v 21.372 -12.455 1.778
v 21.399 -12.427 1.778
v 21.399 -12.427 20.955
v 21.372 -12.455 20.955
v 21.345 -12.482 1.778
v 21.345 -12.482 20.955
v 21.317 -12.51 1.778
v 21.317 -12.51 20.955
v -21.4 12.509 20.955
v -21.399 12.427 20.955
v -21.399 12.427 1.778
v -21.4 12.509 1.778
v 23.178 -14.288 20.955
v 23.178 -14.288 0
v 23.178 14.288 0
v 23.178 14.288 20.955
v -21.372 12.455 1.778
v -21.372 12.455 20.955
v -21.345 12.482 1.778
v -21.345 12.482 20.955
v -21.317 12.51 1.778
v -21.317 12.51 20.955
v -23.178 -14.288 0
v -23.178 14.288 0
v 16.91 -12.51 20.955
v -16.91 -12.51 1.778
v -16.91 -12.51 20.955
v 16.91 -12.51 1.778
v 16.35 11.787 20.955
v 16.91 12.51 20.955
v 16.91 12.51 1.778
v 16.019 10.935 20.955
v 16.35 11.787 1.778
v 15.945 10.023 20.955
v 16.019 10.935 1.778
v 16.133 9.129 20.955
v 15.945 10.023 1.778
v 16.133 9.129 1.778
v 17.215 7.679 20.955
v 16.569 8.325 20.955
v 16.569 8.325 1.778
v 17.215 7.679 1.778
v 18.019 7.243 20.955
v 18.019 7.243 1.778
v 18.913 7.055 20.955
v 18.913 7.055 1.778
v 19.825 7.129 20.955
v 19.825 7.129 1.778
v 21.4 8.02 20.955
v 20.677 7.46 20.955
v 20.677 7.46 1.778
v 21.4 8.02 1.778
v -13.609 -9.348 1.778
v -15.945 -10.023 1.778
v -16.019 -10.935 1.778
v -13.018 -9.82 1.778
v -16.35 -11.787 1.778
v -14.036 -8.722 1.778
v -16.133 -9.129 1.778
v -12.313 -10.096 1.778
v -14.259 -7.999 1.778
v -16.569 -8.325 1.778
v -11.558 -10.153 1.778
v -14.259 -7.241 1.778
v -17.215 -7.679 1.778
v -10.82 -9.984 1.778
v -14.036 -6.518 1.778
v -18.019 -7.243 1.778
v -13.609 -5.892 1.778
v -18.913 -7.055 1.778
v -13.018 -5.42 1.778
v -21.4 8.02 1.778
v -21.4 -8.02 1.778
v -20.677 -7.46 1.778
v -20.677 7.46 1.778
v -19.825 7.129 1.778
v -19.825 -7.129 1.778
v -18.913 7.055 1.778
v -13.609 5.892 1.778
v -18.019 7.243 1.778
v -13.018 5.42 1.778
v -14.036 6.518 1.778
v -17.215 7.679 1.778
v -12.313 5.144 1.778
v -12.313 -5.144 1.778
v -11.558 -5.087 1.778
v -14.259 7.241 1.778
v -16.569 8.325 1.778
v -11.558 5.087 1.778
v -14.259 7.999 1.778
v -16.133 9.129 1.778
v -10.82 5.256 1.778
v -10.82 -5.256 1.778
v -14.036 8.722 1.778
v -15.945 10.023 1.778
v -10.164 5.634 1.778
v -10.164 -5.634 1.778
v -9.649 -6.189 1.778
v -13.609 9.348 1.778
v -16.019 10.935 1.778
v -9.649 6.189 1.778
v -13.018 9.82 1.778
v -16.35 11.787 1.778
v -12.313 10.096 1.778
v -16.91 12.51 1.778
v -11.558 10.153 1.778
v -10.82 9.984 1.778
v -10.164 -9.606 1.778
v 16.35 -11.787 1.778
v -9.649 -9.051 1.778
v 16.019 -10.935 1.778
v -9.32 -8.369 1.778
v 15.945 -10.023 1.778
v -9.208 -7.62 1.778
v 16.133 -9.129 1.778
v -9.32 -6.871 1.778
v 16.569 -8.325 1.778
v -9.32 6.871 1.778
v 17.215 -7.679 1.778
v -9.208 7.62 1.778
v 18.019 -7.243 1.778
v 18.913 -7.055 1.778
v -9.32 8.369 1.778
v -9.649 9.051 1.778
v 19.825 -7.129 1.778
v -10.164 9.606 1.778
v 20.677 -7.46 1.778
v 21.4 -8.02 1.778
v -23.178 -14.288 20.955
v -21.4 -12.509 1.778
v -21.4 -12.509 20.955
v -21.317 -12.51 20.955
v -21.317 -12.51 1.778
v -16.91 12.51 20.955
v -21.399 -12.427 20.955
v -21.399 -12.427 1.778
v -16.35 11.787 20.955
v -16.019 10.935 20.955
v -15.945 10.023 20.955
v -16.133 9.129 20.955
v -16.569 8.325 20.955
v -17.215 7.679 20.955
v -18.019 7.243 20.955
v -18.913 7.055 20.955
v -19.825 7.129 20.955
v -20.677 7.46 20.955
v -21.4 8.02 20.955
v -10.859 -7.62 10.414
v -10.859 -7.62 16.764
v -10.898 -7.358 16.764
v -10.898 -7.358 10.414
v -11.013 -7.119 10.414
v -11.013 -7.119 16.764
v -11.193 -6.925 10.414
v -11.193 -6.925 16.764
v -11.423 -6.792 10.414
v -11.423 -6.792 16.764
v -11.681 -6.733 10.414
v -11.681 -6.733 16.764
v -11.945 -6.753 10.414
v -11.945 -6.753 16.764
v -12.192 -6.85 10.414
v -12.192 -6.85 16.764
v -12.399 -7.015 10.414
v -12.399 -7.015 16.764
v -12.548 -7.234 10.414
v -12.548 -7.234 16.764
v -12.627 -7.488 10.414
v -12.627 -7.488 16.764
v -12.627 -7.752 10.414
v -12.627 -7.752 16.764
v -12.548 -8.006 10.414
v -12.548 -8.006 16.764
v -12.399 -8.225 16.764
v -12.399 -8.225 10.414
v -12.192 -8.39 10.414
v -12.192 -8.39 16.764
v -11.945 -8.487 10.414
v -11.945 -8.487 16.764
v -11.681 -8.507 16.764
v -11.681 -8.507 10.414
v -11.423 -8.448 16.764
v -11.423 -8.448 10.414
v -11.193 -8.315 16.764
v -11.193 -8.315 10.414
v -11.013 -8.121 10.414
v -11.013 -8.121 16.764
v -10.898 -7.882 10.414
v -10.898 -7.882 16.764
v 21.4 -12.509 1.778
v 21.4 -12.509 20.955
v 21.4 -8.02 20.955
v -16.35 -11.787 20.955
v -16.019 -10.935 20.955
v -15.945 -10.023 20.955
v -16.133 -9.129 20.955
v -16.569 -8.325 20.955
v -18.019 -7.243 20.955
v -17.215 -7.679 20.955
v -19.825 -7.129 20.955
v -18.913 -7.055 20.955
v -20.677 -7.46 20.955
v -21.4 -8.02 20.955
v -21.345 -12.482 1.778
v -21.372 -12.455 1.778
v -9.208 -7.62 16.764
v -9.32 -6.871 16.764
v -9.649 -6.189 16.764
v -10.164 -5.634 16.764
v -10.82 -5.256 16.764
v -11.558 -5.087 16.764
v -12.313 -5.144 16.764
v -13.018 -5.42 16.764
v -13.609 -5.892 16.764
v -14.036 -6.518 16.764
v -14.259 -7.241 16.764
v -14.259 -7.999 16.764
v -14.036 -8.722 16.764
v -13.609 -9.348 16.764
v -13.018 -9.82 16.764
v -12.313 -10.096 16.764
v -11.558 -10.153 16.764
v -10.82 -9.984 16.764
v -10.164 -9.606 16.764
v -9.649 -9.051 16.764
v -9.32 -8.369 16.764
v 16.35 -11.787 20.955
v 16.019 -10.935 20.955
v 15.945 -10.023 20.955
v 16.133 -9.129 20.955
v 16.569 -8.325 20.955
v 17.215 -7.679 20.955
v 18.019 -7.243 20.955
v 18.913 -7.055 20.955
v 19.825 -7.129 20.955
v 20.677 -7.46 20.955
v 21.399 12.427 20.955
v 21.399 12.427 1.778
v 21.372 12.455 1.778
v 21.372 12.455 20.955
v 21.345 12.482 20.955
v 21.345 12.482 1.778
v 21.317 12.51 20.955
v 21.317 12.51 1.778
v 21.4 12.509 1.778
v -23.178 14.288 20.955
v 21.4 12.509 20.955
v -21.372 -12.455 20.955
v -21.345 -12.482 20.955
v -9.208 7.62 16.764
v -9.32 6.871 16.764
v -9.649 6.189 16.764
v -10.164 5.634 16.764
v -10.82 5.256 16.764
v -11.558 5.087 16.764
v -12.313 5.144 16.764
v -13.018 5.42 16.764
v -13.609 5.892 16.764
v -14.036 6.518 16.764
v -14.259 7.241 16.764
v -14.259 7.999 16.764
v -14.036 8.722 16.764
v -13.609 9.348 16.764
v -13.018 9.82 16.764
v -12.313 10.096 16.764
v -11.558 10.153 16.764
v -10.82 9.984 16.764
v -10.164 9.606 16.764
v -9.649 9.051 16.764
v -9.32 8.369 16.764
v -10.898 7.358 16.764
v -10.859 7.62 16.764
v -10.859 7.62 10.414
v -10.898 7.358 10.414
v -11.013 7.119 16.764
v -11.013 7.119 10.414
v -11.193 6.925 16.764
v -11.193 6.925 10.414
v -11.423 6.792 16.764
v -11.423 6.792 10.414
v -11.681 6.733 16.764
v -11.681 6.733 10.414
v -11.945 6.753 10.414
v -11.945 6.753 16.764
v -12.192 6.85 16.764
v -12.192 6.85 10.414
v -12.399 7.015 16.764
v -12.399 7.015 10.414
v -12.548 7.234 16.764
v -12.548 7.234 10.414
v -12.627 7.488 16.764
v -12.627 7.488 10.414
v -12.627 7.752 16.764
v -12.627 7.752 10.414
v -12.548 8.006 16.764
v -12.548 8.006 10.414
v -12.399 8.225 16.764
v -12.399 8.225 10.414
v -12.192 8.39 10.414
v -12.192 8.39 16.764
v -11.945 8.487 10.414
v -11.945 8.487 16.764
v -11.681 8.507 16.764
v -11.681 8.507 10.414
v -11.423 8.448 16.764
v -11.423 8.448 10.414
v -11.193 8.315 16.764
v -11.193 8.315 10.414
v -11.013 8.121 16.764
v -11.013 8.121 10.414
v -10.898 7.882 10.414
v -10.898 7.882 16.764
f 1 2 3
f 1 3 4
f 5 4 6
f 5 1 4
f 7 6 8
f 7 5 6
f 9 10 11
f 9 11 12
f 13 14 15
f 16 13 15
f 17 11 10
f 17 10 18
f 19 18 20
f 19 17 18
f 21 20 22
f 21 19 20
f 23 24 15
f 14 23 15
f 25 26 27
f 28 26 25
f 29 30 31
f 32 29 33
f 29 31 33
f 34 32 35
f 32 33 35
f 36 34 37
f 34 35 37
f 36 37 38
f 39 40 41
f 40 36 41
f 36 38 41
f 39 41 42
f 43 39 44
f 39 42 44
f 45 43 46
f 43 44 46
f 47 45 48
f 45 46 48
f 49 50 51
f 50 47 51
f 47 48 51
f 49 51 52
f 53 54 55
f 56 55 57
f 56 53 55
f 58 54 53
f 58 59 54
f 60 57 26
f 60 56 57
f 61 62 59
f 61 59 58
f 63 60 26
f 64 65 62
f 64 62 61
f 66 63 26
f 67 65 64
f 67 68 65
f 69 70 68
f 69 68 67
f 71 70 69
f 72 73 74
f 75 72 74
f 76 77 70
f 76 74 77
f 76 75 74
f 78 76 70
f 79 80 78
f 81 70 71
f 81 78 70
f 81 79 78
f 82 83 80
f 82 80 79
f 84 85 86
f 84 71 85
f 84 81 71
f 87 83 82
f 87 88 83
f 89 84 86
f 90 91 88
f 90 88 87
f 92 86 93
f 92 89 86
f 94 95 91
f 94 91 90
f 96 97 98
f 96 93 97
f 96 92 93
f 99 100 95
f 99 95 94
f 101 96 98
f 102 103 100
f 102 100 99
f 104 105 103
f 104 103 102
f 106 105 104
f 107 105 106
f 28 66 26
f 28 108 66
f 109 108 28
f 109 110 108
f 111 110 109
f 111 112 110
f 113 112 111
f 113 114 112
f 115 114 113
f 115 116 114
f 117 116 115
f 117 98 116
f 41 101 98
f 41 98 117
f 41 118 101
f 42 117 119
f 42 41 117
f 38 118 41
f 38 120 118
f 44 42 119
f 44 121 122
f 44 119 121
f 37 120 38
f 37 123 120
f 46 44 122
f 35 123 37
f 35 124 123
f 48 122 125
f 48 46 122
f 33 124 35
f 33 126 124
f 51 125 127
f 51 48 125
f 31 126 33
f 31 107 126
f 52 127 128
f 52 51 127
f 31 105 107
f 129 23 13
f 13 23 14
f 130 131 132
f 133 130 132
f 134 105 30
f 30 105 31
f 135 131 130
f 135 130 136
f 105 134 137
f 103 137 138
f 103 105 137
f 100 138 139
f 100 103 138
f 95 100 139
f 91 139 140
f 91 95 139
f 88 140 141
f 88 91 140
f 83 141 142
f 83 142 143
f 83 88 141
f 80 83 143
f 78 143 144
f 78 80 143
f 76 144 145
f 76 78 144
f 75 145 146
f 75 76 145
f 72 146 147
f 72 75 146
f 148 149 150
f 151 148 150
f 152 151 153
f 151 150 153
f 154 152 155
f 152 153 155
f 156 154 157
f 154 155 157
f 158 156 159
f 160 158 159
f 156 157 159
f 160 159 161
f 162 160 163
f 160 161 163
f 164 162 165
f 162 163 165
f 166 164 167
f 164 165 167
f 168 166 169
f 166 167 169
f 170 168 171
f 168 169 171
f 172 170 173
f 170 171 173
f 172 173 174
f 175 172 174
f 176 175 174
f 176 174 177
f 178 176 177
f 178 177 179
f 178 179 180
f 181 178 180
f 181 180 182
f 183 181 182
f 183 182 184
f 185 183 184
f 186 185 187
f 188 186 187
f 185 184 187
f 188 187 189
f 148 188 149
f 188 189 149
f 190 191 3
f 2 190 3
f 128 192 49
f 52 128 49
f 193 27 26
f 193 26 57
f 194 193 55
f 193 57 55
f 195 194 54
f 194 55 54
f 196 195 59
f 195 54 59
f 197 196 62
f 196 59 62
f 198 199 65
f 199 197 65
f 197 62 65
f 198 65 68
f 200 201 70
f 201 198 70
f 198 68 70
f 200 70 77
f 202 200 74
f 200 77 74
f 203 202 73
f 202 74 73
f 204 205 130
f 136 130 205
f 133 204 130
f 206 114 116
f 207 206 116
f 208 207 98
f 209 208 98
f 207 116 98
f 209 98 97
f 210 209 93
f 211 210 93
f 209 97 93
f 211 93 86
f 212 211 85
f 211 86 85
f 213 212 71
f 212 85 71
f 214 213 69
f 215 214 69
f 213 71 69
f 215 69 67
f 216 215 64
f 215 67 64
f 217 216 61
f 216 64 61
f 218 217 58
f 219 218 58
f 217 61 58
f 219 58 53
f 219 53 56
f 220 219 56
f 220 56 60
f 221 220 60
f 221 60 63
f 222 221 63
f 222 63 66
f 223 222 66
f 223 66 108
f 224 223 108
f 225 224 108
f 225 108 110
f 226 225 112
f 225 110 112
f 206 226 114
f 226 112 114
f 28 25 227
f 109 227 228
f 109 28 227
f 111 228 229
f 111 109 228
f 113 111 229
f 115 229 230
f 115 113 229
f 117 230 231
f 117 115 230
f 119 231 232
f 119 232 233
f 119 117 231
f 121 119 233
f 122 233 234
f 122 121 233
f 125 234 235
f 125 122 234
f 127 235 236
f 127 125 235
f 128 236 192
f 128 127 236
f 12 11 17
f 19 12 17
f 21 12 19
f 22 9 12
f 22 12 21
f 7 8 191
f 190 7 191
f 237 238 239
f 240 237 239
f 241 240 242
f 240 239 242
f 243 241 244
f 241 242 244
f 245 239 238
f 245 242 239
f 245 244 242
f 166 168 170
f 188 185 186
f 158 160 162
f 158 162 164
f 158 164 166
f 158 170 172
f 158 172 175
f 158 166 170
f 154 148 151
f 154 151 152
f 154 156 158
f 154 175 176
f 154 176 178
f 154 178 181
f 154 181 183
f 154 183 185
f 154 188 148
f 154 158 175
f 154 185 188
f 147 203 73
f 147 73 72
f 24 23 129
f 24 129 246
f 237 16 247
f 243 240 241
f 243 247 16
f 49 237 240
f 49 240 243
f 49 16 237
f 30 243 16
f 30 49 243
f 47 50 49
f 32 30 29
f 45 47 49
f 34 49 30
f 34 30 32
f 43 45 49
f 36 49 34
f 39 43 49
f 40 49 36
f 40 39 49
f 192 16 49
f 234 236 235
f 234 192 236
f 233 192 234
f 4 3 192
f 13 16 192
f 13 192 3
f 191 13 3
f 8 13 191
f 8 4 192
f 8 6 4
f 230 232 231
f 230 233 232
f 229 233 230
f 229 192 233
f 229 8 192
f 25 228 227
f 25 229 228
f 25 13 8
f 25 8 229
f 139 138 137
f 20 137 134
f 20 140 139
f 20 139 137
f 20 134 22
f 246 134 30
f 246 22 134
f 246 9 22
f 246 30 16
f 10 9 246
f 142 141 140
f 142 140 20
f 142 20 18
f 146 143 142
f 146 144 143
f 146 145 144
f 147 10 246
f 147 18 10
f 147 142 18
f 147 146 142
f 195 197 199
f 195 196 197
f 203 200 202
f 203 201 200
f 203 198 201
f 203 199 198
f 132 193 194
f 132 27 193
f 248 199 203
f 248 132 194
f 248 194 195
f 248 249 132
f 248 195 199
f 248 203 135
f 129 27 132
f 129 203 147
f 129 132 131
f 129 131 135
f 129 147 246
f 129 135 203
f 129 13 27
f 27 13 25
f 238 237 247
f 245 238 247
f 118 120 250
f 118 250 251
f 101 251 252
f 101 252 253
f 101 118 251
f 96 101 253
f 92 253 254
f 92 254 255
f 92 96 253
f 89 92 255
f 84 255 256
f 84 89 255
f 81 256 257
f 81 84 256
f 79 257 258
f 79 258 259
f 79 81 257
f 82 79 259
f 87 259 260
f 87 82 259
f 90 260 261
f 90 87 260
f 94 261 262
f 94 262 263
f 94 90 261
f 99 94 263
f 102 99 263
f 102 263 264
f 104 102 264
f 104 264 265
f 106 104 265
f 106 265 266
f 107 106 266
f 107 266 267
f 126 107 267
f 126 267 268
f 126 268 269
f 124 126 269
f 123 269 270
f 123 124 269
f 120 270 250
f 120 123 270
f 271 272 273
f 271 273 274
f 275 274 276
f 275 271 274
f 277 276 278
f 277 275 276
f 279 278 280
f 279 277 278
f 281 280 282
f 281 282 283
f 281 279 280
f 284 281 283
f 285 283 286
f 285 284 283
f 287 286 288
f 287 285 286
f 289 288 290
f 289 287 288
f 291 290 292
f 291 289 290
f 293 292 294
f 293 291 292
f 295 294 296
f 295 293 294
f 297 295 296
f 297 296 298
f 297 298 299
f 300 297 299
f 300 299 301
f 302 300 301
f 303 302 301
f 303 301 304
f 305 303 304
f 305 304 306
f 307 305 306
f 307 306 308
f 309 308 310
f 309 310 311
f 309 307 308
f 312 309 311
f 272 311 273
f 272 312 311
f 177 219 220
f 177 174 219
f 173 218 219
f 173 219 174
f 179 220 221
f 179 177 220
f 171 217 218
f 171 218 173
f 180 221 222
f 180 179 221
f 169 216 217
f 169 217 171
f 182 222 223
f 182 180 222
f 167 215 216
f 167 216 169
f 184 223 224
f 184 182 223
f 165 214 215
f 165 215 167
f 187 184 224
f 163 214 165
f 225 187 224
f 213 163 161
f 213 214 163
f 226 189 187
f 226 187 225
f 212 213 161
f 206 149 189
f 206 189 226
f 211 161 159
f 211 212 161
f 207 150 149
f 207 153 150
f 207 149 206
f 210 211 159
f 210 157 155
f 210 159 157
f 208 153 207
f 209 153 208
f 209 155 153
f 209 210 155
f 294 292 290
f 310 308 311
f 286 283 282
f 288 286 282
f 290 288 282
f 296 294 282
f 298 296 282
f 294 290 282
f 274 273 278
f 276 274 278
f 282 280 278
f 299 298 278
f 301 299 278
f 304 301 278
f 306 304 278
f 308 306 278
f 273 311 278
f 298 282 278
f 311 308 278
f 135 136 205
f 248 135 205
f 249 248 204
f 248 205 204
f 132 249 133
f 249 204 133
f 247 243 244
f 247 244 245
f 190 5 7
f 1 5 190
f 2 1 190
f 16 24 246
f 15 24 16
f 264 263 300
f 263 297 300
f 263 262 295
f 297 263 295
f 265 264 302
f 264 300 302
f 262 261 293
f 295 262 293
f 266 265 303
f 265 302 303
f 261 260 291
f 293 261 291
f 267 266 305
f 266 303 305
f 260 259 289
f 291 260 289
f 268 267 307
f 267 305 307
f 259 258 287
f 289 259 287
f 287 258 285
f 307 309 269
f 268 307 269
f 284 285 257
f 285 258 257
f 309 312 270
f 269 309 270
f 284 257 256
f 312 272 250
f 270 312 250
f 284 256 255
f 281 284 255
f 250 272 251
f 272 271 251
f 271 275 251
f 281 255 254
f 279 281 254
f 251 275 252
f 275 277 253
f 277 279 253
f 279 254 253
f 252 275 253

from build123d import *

# Parameters (mm, degrees)
F0_W             = 46.355
F0_H             = 28.575
F1_DEPTH         = 20.955
F2_T             = -1.778
F3_R             = 2.54
F4_DEPTH         = 14.986
F5_R             = 0.889
F6_DEPTH         = 6.35
F7_R             = 3.175
F8_DEPTH         = 19.177
F8_COPIES2_COUNT = 2


# Not quite as in the source:
# - a pattern or mirror of a feature is missing from the dataset's text; its kind, count and spacing are read off the source's solid


with BuildPart() as f1:
    # F0 (on Top) → F1 (new body)
    with BuildSketch(Plane.XY):
        Rectangle(F0_W, F0_H)
    extrude(amount=F1_DEPTH)

    # F2
    f2_openings = [f1.faces().sort_by_distance(p)[0] for p in [
        (0, 0, 20.955),
    ]]
    offset(amount=F2_T, openings=f2_openings)

    # F3 (on face) → F4 (join)
    with BuildSketch(Plane.XY.offset(1.778)):
        with Locations((-11.7475, -7.62)):
            Circle(F3_R)
    f4 = extrude(amount=F4_DEPTH)

    # F4_copies: F4 across plane
    add(f4.mirror(Plane.ZX))

    # F5 (on face) → F6 (cut)
    with BuildSketch(Plane.XY.offset(16.764)):
        with Locations((-11.7475, -7.62)):
            Circle(F5_R)
    f6 = extrude(amount=-F6_DEPTH, mode=Mode.SUBTRACT)

    # F6_copies: F6 across plane
    add(f6.mirror(Plane.ZX), mode=Mode.SUBTRACT)

    # F7 (on face) → F8 (join, through all)
    with BuildSketch(Plane.XY.offset(1.778)):
        with Locations((-19.1135, -10.2235)):
            Circle(F7_R)
    f8 = extrude(amount=F8_DEPTH)

    # F8_copies: F8 across plane
    add(f8.mirror(Plane.ZX))

    # F8_copies1: F8 across plane
    add(f8.mirror(Plane(origin=(0, 0, 0), x_dir=(0, 0, 1), z_dir=(1, 0, 0))))

    # F8_copies2: F8 ×2 about axis
    f8_copies2_axis = Axis((0, 0, 0), (0, 0, 1))
    for i in range(1, F8_COPIES2_COUNT):
        add(f8.rotate(f8_copies2_axis, i * 360 / F8_COPIES2_COUNT))


solid = f1.part
